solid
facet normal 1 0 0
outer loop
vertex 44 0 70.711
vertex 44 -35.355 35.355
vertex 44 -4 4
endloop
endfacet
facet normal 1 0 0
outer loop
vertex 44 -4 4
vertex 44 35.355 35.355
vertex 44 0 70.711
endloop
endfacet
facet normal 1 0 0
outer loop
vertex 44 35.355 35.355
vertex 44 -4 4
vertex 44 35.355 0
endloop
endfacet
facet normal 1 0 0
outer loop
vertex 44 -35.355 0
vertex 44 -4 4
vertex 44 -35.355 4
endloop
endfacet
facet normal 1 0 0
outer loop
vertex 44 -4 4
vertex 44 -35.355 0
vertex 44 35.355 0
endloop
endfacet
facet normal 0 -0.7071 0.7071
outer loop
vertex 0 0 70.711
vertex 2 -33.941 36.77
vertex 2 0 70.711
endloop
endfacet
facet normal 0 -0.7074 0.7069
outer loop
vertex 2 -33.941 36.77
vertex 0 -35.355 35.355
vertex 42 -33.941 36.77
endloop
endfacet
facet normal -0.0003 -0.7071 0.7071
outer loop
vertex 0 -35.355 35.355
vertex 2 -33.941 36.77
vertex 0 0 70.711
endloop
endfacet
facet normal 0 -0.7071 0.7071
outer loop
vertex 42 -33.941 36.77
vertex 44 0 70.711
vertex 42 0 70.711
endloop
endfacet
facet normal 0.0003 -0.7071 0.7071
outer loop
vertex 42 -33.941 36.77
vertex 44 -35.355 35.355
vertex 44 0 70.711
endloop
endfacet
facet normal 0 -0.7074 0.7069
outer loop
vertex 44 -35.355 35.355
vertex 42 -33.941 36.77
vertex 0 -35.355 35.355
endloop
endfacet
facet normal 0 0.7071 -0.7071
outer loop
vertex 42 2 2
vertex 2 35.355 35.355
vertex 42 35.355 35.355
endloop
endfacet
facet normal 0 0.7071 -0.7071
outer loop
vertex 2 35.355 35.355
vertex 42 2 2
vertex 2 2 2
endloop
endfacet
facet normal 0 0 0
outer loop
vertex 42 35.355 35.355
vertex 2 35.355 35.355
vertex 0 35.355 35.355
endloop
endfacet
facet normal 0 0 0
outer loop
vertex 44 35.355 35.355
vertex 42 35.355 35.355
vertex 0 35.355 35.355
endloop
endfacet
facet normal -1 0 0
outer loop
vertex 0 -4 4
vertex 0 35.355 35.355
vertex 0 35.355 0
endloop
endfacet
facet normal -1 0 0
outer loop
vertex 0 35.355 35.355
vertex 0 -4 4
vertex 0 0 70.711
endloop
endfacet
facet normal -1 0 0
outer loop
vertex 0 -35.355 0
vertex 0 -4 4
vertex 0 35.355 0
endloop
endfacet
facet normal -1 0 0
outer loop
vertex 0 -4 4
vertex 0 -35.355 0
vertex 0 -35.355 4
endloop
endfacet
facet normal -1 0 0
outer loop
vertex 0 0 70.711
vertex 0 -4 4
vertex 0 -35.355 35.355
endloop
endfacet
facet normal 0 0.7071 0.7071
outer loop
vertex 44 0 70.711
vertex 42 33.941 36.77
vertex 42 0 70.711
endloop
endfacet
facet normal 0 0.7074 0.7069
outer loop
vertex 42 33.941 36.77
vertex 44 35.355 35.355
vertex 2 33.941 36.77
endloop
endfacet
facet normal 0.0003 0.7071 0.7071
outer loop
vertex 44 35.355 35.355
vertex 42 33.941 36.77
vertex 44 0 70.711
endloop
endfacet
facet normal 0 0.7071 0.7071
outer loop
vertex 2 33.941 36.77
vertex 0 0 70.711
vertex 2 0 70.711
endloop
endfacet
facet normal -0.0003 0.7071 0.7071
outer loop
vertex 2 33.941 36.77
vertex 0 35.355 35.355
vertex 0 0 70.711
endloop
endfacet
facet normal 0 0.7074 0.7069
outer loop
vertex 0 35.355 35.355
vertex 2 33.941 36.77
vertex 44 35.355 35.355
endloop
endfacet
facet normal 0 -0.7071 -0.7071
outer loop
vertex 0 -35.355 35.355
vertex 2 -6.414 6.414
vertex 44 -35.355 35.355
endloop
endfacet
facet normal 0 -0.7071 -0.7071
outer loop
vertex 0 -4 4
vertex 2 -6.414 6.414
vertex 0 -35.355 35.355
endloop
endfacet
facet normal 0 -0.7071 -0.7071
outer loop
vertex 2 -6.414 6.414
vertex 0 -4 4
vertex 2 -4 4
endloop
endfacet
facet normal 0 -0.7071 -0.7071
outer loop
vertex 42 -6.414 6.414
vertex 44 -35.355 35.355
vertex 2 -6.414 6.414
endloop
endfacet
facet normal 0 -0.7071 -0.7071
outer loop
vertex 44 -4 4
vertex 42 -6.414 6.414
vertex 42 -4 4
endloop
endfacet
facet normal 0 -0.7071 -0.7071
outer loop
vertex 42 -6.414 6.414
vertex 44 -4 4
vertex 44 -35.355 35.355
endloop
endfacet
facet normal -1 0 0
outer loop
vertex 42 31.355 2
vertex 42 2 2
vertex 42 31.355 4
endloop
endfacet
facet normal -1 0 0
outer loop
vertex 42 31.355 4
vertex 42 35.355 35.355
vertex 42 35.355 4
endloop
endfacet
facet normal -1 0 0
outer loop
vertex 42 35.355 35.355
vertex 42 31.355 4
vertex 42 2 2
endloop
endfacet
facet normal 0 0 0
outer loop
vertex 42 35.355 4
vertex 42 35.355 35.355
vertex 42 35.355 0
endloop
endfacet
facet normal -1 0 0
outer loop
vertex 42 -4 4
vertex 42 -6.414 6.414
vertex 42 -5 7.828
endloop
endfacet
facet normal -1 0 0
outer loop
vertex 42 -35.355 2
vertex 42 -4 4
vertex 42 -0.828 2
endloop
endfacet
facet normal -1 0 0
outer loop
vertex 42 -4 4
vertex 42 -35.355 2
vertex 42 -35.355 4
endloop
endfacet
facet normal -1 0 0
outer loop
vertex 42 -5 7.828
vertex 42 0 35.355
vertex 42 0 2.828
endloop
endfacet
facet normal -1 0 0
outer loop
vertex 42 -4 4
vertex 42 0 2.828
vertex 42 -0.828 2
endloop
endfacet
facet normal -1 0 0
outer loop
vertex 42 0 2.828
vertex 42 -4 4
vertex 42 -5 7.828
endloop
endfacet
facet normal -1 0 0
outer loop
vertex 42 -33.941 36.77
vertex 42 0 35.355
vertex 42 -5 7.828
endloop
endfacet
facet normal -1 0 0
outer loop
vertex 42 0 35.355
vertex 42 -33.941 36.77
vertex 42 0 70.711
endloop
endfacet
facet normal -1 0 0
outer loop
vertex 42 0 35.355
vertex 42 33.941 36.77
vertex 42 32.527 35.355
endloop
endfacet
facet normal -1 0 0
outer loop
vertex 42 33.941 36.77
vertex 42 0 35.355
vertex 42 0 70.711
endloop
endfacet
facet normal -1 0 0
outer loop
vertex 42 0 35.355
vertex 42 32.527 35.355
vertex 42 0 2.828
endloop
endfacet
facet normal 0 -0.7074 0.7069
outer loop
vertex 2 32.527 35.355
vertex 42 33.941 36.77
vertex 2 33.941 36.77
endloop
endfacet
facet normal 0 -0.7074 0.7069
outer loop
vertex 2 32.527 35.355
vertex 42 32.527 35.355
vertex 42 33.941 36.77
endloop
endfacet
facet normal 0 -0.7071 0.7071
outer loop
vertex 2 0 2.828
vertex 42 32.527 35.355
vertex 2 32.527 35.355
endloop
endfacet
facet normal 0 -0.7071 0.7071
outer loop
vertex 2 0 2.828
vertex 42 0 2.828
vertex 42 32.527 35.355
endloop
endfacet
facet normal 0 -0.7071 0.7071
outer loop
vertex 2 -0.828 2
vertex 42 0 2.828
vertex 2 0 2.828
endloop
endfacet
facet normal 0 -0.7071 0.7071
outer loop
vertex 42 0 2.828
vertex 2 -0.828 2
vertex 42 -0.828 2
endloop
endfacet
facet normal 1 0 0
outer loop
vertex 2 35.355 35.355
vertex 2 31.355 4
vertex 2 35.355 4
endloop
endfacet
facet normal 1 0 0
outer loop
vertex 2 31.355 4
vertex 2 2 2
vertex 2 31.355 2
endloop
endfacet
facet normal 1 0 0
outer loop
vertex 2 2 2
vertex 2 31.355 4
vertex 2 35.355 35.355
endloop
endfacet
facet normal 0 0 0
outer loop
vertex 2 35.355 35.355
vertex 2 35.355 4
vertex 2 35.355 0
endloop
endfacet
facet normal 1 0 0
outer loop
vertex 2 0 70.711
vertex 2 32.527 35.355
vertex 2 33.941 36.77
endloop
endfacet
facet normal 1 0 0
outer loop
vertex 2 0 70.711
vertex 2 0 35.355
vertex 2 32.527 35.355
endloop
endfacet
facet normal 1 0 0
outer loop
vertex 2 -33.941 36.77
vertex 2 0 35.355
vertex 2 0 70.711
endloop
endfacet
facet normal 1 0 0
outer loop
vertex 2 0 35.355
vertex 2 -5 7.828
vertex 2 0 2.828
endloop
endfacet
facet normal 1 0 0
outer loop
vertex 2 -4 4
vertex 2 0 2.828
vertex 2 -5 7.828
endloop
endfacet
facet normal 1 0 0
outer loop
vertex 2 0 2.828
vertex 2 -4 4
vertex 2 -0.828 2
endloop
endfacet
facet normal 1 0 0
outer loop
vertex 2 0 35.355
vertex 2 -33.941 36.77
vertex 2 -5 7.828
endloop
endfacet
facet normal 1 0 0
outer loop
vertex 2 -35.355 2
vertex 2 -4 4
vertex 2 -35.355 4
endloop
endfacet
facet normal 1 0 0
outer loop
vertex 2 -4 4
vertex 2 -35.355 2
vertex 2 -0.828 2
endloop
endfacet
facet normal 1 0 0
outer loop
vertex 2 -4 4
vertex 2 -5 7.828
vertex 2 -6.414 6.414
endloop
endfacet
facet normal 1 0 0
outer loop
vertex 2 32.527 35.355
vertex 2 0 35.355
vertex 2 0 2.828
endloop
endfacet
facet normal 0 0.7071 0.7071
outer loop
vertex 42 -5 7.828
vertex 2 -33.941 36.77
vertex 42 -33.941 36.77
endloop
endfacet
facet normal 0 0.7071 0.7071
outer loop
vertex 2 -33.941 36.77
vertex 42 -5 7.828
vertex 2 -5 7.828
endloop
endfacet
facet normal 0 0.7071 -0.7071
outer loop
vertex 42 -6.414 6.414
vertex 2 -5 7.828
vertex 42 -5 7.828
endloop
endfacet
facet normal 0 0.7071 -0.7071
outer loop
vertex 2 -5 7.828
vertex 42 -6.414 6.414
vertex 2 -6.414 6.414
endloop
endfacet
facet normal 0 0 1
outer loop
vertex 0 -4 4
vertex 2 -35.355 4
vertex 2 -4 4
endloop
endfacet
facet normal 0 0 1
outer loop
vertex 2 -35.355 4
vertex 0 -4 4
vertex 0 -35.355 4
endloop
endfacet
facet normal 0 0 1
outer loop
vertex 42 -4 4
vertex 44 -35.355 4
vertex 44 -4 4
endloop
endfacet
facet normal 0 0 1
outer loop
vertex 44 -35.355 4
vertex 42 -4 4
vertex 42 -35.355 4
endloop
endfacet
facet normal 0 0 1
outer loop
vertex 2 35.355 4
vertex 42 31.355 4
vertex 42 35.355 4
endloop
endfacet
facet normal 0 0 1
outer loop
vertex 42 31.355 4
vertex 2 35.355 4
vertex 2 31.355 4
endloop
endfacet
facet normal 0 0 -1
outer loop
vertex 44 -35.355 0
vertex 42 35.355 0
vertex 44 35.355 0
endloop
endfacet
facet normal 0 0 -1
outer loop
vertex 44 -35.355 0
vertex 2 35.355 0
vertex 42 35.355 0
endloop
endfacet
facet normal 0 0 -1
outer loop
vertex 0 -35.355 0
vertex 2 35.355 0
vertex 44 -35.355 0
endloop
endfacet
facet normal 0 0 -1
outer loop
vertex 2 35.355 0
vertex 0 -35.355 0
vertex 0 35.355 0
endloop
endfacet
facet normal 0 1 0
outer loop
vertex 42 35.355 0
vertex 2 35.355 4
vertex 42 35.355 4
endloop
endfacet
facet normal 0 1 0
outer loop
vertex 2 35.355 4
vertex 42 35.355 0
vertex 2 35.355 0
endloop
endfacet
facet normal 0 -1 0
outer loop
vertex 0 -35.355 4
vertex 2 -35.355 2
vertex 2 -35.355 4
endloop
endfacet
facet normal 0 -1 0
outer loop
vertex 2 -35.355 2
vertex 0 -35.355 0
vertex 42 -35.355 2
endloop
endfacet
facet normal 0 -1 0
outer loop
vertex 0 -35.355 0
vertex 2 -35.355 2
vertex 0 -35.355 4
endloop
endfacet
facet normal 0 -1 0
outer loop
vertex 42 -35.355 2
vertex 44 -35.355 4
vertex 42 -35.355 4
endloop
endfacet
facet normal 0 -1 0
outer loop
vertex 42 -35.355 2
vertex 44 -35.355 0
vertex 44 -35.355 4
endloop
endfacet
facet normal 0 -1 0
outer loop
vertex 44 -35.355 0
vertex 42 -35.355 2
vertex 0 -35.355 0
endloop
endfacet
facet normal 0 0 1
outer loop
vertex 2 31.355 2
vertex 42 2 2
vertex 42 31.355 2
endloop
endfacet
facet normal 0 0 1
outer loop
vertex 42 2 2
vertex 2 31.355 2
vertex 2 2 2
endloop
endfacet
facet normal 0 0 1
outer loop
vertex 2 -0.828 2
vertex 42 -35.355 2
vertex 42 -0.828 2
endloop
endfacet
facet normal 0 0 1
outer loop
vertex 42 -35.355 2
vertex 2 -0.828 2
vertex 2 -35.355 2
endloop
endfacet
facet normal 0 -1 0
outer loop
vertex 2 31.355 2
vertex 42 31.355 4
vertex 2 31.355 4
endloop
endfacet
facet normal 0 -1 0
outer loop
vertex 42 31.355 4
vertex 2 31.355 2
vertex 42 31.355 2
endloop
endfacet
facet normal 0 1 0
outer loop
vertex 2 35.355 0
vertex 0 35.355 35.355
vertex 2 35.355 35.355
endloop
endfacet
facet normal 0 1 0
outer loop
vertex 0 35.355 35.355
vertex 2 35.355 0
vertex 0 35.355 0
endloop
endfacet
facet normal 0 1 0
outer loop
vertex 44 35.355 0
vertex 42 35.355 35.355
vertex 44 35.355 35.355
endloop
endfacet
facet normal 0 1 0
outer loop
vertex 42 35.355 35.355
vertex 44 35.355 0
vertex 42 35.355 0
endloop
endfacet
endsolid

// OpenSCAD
width = 40;
maxdiameter = 100;
thickness = 2;
wirethickness = 5/sin(45);

length=sqrt(2*(maxdiameter/2*maxdiameter/2));

rotate([45]) {
  difference() {
    cube([width + 2*thickness, maxdiameter/2, maxdiameter/2]);
    translate([thickness,thickness,thickness]) cube([width, maxdiameter/2, maxdiameter/2]);
    translate([thickness,-1,thickness]) cube([width, thickness+2, wirethickness]);
  }
}

translate([0,-length/2,0]) difference() {
  cube([width+2*thickness,length,2*thickness]);
  translate([thickness,-1,thickness]) cube([width,length-thickness-1,thickness+1]);
}

cube([thickness,length/2,length/2]);
translate([width+thickness,0,0]) cube([thickness,length/2,length/2]);
